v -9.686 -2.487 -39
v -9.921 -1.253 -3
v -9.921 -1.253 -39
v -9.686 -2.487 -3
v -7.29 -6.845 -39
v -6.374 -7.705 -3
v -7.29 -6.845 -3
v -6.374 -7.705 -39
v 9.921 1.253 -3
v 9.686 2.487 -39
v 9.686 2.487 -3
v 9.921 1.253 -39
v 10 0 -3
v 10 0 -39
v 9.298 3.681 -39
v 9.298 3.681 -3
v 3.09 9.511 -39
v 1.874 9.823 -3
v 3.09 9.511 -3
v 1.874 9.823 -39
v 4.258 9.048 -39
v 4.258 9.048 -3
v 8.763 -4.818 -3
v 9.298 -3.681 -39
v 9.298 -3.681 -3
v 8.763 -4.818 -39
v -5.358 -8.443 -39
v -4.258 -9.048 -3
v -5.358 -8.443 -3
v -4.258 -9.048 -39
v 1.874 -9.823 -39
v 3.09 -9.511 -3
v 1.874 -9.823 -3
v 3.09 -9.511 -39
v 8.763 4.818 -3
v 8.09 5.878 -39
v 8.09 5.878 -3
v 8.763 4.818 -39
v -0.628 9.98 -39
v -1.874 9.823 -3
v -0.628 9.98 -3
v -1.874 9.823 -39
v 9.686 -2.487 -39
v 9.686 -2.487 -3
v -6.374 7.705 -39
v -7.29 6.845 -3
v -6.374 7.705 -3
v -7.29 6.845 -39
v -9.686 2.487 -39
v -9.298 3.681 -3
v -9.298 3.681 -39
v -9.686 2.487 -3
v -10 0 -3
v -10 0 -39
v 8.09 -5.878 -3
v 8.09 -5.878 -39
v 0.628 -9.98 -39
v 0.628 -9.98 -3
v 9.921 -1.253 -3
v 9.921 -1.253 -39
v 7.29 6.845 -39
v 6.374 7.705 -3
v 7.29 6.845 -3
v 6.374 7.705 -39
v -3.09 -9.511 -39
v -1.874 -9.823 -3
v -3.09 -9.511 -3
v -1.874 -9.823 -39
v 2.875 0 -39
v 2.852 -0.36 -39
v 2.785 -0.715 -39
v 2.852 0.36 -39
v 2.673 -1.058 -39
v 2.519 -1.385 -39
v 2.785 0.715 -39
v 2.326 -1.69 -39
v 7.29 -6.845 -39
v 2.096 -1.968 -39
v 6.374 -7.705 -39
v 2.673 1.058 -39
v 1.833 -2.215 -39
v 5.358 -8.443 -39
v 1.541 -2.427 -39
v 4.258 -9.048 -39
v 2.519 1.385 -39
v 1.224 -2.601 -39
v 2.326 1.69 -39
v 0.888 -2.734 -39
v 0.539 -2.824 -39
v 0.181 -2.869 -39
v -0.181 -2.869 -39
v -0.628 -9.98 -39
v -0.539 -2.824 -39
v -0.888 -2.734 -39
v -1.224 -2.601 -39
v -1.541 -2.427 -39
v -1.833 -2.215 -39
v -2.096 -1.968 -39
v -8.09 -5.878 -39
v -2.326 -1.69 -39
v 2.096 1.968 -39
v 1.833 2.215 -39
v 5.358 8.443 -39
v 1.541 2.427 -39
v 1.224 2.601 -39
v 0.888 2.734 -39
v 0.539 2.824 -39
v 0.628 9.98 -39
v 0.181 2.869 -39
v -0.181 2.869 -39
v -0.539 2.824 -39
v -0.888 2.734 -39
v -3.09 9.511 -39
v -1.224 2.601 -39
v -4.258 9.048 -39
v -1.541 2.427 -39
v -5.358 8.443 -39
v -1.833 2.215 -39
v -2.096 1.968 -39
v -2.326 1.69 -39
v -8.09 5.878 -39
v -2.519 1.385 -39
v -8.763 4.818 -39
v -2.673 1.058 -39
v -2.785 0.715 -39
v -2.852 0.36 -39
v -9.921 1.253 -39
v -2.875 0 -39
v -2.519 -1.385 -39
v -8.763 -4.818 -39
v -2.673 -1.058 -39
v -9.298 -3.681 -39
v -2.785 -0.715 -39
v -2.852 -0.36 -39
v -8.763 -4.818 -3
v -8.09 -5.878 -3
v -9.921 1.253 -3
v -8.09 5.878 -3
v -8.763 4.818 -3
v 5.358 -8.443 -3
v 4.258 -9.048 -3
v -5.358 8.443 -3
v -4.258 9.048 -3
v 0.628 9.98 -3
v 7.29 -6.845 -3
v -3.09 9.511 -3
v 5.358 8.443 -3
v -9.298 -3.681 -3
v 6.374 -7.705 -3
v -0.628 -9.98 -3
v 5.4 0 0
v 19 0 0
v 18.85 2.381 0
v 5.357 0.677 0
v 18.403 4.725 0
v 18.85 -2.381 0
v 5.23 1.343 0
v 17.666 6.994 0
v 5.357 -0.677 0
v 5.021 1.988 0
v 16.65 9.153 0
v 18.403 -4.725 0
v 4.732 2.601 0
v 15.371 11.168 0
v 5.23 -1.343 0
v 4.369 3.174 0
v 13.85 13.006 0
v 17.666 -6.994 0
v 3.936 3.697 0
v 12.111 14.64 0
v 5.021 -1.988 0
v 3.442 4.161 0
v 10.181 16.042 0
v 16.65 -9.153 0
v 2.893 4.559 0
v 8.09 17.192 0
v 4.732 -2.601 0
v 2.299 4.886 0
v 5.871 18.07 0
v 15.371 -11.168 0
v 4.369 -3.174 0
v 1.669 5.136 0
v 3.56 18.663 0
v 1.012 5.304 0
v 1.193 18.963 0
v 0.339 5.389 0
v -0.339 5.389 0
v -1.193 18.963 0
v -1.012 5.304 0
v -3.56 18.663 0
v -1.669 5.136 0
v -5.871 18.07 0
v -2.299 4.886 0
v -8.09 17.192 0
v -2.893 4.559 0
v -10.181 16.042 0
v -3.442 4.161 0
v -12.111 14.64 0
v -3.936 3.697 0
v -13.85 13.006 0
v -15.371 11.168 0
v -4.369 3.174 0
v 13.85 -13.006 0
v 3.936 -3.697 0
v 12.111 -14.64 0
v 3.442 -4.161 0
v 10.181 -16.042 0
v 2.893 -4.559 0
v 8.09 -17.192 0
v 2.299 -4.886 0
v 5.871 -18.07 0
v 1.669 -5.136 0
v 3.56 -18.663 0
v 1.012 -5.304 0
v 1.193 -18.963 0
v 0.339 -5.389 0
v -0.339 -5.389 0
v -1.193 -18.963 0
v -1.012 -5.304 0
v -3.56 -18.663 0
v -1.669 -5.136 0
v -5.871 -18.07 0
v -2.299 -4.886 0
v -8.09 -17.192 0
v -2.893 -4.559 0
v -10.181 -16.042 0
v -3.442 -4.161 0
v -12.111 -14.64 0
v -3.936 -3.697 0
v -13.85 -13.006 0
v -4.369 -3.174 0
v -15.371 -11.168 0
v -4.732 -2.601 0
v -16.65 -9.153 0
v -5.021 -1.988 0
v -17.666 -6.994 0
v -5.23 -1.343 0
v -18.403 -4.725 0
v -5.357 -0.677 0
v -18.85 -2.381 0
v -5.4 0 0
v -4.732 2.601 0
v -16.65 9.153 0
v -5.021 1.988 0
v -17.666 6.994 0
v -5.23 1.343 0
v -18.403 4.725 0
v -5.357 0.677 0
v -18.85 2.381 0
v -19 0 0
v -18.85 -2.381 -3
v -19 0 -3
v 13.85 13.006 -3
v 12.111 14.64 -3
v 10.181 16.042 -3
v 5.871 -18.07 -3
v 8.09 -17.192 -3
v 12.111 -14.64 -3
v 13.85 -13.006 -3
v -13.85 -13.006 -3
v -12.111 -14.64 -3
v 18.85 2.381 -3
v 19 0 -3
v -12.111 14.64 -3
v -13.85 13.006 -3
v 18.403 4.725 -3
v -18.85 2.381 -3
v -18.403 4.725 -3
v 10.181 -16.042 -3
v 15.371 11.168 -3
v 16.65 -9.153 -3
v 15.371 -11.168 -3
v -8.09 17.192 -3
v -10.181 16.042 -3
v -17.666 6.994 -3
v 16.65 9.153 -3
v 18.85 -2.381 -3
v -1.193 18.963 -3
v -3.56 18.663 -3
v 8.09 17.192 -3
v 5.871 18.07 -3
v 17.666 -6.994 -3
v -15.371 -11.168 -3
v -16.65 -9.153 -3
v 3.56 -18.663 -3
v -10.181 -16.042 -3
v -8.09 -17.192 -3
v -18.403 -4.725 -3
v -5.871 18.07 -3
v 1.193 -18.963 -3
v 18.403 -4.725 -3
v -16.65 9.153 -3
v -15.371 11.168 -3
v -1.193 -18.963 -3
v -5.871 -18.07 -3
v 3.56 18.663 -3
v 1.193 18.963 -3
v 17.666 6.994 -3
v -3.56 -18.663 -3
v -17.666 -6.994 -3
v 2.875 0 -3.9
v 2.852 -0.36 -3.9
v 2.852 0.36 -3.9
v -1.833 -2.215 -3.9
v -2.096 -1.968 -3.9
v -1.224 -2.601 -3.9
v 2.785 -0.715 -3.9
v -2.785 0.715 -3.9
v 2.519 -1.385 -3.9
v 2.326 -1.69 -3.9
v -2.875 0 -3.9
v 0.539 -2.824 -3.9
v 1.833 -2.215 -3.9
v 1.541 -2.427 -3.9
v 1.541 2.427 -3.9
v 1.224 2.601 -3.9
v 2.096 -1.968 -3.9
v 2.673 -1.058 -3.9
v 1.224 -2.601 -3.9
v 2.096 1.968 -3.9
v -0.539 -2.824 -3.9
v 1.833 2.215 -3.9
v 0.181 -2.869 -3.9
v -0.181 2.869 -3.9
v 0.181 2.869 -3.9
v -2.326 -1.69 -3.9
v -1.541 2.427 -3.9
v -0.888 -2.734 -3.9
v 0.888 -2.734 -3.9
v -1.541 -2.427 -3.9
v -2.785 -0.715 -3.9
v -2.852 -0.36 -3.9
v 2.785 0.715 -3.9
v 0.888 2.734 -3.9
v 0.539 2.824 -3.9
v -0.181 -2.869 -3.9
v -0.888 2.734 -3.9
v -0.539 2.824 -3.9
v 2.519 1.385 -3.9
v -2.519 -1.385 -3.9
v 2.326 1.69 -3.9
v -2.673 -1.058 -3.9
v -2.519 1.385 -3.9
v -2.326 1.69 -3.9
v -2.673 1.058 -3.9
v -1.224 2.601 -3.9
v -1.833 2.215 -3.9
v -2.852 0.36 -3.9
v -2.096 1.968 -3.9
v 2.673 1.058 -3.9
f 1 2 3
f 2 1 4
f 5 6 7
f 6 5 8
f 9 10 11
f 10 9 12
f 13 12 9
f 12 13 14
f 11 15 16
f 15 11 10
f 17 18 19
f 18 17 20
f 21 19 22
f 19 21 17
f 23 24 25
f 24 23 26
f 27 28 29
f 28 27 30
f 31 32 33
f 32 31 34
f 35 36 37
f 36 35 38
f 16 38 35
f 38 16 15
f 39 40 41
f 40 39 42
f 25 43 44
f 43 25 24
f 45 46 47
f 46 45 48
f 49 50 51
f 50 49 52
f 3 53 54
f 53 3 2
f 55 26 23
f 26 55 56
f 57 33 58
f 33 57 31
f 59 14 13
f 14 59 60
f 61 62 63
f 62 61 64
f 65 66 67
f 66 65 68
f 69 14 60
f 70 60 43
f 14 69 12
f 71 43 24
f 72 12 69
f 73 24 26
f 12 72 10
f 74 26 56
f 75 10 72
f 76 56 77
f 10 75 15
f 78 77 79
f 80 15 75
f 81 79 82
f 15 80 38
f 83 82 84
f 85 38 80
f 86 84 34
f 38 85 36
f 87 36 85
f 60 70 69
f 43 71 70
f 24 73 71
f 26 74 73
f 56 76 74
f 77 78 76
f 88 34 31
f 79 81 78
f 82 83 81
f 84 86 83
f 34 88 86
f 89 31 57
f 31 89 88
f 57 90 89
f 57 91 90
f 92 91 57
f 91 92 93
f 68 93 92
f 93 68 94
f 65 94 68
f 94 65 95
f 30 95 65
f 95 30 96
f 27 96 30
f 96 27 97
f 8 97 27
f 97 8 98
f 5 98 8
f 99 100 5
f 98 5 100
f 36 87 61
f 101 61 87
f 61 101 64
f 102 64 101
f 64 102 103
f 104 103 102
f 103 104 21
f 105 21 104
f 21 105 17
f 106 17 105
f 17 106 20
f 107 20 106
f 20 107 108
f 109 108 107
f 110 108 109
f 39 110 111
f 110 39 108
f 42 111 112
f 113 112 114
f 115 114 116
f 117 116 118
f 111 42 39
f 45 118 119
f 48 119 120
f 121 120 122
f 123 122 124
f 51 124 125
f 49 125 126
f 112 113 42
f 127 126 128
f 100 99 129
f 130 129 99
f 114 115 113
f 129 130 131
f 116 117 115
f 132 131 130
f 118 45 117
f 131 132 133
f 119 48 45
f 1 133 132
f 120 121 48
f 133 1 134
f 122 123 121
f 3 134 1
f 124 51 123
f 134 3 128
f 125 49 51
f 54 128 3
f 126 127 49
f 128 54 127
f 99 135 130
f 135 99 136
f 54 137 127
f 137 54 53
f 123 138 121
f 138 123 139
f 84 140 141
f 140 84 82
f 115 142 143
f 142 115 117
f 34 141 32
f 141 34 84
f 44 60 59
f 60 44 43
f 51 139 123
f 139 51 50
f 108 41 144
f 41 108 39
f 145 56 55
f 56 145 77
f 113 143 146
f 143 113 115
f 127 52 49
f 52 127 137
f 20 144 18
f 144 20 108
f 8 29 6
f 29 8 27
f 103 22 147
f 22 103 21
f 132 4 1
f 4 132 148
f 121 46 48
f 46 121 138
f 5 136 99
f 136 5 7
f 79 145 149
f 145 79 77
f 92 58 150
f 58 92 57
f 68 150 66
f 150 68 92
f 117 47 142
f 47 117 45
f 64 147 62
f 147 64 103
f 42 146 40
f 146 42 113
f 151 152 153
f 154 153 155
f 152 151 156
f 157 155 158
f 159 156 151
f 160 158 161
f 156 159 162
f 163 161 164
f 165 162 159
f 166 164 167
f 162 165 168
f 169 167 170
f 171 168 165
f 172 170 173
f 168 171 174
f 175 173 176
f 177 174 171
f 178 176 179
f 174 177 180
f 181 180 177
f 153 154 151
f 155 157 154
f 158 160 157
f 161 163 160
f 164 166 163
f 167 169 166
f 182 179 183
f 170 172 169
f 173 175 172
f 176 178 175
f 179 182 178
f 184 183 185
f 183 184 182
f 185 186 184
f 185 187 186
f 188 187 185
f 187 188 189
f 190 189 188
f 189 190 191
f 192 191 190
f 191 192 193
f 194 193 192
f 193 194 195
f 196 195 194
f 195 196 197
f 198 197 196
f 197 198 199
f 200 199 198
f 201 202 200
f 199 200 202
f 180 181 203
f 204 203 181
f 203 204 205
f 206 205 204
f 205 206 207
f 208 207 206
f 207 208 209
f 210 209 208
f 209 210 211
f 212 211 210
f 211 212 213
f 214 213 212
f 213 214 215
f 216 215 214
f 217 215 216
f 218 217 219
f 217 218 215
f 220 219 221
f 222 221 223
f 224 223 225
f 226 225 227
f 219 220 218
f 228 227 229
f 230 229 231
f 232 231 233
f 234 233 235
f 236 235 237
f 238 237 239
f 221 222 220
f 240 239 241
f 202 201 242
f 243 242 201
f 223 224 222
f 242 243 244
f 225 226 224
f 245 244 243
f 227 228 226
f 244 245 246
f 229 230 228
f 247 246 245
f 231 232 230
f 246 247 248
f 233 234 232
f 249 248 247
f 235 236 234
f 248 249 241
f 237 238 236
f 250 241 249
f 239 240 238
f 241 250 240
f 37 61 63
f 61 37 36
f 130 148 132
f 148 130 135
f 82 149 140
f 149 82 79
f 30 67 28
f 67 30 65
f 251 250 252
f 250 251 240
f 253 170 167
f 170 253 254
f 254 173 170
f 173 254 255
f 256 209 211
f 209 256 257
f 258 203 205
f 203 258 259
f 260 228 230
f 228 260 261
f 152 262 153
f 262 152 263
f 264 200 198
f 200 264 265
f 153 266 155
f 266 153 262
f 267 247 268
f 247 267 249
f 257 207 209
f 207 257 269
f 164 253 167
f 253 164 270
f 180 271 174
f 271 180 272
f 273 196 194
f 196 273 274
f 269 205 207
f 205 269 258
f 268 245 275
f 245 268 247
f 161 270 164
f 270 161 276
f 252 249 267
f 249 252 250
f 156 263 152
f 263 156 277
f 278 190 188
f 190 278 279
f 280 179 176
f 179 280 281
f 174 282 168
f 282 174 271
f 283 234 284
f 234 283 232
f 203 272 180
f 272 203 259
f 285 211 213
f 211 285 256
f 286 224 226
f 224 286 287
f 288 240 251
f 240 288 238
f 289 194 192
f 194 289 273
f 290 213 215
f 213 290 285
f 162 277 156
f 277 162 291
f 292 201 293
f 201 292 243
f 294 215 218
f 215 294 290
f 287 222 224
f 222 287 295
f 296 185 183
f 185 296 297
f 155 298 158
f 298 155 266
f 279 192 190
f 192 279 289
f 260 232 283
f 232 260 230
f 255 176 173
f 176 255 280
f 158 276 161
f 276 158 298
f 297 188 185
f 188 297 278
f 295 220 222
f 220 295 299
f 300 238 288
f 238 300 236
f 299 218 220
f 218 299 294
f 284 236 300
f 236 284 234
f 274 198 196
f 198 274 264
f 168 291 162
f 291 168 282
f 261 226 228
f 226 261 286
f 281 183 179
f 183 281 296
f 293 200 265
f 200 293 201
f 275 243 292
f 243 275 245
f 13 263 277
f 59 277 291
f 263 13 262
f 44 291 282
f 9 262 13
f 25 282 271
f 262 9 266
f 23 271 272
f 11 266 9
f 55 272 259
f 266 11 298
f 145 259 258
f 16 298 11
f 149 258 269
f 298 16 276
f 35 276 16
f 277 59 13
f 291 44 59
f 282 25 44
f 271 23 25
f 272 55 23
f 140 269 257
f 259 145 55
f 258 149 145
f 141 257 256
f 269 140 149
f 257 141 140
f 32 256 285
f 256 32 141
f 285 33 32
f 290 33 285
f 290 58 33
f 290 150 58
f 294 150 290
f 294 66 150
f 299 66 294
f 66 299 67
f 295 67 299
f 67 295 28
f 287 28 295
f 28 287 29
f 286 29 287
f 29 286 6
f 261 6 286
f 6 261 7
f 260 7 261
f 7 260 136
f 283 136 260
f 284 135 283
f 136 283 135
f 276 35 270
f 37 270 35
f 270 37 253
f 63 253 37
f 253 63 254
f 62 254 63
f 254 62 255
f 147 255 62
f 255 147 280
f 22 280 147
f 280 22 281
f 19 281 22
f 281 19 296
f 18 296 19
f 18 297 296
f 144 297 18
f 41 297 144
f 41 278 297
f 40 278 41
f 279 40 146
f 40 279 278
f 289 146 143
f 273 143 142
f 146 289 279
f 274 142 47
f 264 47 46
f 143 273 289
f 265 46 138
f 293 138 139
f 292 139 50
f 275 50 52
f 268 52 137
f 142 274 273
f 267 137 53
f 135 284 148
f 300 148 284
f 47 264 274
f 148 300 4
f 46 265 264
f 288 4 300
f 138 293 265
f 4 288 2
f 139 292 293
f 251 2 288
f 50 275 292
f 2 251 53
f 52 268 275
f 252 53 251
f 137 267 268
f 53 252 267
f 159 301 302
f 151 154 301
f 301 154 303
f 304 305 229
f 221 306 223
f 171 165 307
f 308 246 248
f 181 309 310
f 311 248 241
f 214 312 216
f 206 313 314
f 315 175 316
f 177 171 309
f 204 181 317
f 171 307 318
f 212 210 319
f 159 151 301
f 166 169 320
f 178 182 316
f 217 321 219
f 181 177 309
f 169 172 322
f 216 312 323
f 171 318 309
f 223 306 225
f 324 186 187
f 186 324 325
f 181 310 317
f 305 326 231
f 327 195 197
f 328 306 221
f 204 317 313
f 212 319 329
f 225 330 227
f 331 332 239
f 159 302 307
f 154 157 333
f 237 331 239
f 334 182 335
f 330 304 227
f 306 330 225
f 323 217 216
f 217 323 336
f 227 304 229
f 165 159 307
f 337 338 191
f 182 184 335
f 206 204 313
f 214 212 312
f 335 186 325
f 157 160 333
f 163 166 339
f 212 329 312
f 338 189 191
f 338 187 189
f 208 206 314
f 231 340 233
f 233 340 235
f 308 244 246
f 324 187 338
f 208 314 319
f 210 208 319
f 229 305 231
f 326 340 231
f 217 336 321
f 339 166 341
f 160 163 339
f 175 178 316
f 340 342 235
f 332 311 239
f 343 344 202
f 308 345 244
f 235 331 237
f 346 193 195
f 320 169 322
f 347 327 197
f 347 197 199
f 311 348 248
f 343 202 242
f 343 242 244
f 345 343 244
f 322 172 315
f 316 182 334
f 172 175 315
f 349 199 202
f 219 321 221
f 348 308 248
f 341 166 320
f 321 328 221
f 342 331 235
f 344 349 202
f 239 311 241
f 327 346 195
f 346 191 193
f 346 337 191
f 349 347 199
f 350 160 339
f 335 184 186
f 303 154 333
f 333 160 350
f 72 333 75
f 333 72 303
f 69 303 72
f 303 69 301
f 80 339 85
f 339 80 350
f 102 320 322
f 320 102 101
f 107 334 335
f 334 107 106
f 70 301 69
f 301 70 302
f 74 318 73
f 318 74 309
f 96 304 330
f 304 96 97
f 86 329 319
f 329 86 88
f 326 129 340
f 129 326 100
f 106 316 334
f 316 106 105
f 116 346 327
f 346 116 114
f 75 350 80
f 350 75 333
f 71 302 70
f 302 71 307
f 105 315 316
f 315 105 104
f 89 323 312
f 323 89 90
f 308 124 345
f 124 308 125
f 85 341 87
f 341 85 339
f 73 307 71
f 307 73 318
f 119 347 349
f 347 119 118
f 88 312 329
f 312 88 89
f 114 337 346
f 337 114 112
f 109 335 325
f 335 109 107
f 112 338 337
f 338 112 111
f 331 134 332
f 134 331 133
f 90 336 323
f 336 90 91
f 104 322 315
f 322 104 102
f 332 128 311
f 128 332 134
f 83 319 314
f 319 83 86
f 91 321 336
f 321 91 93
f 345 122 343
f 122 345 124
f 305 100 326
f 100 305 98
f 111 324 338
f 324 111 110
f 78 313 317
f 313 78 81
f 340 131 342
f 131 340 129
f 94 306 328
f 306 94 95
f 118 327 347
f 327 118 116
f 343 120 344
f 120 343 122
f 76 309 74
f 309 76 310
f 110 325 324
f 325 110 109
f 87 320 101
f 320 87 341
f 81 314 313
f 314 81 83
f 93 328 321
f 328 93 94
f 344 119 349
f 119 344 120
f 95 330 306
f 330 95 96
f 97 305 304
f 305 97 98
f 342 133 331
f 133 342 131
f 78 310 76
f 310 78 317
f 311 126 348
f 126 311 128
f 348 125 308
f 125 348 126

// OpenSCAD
$fn = 50;


difference() {
	union() {
		translate(v = [0, 0, -39.0000000000]) {
			cylinder(h = 39, r = 10.0000000000);
		}
		translate(v = [0, 0, -3.0000000000]) {
			cylinder(h = 3, r = 19.0000000000);
		}
	}
	union() {
		translate(v = [0, 0, 0]) {
			rotate(a = [0, 0, 0]) {
				difference() {
					union() {
						#translate(v = [0, 0, -39.0000000000]) {
							cylinder(h = 39, r = 2.6000000000);
						}
						#translate(v = [0, 0, -3.9000000000]) {
							cylinder(h = 3.9000000000, r1 = 2.8750000000, r2 = 5.4000000000);
						}
						#translate(v = [0, 0, -39.0000000000]) {
							cylinder(h = 39, r = 2.8750000000);
						}
						#translate(v = [0, 0, -39.0000000000]) {
							cylinder(h = 39, r = 2.6000000000);
						}
					}
					union();
				}
			}
		}
	}
}
